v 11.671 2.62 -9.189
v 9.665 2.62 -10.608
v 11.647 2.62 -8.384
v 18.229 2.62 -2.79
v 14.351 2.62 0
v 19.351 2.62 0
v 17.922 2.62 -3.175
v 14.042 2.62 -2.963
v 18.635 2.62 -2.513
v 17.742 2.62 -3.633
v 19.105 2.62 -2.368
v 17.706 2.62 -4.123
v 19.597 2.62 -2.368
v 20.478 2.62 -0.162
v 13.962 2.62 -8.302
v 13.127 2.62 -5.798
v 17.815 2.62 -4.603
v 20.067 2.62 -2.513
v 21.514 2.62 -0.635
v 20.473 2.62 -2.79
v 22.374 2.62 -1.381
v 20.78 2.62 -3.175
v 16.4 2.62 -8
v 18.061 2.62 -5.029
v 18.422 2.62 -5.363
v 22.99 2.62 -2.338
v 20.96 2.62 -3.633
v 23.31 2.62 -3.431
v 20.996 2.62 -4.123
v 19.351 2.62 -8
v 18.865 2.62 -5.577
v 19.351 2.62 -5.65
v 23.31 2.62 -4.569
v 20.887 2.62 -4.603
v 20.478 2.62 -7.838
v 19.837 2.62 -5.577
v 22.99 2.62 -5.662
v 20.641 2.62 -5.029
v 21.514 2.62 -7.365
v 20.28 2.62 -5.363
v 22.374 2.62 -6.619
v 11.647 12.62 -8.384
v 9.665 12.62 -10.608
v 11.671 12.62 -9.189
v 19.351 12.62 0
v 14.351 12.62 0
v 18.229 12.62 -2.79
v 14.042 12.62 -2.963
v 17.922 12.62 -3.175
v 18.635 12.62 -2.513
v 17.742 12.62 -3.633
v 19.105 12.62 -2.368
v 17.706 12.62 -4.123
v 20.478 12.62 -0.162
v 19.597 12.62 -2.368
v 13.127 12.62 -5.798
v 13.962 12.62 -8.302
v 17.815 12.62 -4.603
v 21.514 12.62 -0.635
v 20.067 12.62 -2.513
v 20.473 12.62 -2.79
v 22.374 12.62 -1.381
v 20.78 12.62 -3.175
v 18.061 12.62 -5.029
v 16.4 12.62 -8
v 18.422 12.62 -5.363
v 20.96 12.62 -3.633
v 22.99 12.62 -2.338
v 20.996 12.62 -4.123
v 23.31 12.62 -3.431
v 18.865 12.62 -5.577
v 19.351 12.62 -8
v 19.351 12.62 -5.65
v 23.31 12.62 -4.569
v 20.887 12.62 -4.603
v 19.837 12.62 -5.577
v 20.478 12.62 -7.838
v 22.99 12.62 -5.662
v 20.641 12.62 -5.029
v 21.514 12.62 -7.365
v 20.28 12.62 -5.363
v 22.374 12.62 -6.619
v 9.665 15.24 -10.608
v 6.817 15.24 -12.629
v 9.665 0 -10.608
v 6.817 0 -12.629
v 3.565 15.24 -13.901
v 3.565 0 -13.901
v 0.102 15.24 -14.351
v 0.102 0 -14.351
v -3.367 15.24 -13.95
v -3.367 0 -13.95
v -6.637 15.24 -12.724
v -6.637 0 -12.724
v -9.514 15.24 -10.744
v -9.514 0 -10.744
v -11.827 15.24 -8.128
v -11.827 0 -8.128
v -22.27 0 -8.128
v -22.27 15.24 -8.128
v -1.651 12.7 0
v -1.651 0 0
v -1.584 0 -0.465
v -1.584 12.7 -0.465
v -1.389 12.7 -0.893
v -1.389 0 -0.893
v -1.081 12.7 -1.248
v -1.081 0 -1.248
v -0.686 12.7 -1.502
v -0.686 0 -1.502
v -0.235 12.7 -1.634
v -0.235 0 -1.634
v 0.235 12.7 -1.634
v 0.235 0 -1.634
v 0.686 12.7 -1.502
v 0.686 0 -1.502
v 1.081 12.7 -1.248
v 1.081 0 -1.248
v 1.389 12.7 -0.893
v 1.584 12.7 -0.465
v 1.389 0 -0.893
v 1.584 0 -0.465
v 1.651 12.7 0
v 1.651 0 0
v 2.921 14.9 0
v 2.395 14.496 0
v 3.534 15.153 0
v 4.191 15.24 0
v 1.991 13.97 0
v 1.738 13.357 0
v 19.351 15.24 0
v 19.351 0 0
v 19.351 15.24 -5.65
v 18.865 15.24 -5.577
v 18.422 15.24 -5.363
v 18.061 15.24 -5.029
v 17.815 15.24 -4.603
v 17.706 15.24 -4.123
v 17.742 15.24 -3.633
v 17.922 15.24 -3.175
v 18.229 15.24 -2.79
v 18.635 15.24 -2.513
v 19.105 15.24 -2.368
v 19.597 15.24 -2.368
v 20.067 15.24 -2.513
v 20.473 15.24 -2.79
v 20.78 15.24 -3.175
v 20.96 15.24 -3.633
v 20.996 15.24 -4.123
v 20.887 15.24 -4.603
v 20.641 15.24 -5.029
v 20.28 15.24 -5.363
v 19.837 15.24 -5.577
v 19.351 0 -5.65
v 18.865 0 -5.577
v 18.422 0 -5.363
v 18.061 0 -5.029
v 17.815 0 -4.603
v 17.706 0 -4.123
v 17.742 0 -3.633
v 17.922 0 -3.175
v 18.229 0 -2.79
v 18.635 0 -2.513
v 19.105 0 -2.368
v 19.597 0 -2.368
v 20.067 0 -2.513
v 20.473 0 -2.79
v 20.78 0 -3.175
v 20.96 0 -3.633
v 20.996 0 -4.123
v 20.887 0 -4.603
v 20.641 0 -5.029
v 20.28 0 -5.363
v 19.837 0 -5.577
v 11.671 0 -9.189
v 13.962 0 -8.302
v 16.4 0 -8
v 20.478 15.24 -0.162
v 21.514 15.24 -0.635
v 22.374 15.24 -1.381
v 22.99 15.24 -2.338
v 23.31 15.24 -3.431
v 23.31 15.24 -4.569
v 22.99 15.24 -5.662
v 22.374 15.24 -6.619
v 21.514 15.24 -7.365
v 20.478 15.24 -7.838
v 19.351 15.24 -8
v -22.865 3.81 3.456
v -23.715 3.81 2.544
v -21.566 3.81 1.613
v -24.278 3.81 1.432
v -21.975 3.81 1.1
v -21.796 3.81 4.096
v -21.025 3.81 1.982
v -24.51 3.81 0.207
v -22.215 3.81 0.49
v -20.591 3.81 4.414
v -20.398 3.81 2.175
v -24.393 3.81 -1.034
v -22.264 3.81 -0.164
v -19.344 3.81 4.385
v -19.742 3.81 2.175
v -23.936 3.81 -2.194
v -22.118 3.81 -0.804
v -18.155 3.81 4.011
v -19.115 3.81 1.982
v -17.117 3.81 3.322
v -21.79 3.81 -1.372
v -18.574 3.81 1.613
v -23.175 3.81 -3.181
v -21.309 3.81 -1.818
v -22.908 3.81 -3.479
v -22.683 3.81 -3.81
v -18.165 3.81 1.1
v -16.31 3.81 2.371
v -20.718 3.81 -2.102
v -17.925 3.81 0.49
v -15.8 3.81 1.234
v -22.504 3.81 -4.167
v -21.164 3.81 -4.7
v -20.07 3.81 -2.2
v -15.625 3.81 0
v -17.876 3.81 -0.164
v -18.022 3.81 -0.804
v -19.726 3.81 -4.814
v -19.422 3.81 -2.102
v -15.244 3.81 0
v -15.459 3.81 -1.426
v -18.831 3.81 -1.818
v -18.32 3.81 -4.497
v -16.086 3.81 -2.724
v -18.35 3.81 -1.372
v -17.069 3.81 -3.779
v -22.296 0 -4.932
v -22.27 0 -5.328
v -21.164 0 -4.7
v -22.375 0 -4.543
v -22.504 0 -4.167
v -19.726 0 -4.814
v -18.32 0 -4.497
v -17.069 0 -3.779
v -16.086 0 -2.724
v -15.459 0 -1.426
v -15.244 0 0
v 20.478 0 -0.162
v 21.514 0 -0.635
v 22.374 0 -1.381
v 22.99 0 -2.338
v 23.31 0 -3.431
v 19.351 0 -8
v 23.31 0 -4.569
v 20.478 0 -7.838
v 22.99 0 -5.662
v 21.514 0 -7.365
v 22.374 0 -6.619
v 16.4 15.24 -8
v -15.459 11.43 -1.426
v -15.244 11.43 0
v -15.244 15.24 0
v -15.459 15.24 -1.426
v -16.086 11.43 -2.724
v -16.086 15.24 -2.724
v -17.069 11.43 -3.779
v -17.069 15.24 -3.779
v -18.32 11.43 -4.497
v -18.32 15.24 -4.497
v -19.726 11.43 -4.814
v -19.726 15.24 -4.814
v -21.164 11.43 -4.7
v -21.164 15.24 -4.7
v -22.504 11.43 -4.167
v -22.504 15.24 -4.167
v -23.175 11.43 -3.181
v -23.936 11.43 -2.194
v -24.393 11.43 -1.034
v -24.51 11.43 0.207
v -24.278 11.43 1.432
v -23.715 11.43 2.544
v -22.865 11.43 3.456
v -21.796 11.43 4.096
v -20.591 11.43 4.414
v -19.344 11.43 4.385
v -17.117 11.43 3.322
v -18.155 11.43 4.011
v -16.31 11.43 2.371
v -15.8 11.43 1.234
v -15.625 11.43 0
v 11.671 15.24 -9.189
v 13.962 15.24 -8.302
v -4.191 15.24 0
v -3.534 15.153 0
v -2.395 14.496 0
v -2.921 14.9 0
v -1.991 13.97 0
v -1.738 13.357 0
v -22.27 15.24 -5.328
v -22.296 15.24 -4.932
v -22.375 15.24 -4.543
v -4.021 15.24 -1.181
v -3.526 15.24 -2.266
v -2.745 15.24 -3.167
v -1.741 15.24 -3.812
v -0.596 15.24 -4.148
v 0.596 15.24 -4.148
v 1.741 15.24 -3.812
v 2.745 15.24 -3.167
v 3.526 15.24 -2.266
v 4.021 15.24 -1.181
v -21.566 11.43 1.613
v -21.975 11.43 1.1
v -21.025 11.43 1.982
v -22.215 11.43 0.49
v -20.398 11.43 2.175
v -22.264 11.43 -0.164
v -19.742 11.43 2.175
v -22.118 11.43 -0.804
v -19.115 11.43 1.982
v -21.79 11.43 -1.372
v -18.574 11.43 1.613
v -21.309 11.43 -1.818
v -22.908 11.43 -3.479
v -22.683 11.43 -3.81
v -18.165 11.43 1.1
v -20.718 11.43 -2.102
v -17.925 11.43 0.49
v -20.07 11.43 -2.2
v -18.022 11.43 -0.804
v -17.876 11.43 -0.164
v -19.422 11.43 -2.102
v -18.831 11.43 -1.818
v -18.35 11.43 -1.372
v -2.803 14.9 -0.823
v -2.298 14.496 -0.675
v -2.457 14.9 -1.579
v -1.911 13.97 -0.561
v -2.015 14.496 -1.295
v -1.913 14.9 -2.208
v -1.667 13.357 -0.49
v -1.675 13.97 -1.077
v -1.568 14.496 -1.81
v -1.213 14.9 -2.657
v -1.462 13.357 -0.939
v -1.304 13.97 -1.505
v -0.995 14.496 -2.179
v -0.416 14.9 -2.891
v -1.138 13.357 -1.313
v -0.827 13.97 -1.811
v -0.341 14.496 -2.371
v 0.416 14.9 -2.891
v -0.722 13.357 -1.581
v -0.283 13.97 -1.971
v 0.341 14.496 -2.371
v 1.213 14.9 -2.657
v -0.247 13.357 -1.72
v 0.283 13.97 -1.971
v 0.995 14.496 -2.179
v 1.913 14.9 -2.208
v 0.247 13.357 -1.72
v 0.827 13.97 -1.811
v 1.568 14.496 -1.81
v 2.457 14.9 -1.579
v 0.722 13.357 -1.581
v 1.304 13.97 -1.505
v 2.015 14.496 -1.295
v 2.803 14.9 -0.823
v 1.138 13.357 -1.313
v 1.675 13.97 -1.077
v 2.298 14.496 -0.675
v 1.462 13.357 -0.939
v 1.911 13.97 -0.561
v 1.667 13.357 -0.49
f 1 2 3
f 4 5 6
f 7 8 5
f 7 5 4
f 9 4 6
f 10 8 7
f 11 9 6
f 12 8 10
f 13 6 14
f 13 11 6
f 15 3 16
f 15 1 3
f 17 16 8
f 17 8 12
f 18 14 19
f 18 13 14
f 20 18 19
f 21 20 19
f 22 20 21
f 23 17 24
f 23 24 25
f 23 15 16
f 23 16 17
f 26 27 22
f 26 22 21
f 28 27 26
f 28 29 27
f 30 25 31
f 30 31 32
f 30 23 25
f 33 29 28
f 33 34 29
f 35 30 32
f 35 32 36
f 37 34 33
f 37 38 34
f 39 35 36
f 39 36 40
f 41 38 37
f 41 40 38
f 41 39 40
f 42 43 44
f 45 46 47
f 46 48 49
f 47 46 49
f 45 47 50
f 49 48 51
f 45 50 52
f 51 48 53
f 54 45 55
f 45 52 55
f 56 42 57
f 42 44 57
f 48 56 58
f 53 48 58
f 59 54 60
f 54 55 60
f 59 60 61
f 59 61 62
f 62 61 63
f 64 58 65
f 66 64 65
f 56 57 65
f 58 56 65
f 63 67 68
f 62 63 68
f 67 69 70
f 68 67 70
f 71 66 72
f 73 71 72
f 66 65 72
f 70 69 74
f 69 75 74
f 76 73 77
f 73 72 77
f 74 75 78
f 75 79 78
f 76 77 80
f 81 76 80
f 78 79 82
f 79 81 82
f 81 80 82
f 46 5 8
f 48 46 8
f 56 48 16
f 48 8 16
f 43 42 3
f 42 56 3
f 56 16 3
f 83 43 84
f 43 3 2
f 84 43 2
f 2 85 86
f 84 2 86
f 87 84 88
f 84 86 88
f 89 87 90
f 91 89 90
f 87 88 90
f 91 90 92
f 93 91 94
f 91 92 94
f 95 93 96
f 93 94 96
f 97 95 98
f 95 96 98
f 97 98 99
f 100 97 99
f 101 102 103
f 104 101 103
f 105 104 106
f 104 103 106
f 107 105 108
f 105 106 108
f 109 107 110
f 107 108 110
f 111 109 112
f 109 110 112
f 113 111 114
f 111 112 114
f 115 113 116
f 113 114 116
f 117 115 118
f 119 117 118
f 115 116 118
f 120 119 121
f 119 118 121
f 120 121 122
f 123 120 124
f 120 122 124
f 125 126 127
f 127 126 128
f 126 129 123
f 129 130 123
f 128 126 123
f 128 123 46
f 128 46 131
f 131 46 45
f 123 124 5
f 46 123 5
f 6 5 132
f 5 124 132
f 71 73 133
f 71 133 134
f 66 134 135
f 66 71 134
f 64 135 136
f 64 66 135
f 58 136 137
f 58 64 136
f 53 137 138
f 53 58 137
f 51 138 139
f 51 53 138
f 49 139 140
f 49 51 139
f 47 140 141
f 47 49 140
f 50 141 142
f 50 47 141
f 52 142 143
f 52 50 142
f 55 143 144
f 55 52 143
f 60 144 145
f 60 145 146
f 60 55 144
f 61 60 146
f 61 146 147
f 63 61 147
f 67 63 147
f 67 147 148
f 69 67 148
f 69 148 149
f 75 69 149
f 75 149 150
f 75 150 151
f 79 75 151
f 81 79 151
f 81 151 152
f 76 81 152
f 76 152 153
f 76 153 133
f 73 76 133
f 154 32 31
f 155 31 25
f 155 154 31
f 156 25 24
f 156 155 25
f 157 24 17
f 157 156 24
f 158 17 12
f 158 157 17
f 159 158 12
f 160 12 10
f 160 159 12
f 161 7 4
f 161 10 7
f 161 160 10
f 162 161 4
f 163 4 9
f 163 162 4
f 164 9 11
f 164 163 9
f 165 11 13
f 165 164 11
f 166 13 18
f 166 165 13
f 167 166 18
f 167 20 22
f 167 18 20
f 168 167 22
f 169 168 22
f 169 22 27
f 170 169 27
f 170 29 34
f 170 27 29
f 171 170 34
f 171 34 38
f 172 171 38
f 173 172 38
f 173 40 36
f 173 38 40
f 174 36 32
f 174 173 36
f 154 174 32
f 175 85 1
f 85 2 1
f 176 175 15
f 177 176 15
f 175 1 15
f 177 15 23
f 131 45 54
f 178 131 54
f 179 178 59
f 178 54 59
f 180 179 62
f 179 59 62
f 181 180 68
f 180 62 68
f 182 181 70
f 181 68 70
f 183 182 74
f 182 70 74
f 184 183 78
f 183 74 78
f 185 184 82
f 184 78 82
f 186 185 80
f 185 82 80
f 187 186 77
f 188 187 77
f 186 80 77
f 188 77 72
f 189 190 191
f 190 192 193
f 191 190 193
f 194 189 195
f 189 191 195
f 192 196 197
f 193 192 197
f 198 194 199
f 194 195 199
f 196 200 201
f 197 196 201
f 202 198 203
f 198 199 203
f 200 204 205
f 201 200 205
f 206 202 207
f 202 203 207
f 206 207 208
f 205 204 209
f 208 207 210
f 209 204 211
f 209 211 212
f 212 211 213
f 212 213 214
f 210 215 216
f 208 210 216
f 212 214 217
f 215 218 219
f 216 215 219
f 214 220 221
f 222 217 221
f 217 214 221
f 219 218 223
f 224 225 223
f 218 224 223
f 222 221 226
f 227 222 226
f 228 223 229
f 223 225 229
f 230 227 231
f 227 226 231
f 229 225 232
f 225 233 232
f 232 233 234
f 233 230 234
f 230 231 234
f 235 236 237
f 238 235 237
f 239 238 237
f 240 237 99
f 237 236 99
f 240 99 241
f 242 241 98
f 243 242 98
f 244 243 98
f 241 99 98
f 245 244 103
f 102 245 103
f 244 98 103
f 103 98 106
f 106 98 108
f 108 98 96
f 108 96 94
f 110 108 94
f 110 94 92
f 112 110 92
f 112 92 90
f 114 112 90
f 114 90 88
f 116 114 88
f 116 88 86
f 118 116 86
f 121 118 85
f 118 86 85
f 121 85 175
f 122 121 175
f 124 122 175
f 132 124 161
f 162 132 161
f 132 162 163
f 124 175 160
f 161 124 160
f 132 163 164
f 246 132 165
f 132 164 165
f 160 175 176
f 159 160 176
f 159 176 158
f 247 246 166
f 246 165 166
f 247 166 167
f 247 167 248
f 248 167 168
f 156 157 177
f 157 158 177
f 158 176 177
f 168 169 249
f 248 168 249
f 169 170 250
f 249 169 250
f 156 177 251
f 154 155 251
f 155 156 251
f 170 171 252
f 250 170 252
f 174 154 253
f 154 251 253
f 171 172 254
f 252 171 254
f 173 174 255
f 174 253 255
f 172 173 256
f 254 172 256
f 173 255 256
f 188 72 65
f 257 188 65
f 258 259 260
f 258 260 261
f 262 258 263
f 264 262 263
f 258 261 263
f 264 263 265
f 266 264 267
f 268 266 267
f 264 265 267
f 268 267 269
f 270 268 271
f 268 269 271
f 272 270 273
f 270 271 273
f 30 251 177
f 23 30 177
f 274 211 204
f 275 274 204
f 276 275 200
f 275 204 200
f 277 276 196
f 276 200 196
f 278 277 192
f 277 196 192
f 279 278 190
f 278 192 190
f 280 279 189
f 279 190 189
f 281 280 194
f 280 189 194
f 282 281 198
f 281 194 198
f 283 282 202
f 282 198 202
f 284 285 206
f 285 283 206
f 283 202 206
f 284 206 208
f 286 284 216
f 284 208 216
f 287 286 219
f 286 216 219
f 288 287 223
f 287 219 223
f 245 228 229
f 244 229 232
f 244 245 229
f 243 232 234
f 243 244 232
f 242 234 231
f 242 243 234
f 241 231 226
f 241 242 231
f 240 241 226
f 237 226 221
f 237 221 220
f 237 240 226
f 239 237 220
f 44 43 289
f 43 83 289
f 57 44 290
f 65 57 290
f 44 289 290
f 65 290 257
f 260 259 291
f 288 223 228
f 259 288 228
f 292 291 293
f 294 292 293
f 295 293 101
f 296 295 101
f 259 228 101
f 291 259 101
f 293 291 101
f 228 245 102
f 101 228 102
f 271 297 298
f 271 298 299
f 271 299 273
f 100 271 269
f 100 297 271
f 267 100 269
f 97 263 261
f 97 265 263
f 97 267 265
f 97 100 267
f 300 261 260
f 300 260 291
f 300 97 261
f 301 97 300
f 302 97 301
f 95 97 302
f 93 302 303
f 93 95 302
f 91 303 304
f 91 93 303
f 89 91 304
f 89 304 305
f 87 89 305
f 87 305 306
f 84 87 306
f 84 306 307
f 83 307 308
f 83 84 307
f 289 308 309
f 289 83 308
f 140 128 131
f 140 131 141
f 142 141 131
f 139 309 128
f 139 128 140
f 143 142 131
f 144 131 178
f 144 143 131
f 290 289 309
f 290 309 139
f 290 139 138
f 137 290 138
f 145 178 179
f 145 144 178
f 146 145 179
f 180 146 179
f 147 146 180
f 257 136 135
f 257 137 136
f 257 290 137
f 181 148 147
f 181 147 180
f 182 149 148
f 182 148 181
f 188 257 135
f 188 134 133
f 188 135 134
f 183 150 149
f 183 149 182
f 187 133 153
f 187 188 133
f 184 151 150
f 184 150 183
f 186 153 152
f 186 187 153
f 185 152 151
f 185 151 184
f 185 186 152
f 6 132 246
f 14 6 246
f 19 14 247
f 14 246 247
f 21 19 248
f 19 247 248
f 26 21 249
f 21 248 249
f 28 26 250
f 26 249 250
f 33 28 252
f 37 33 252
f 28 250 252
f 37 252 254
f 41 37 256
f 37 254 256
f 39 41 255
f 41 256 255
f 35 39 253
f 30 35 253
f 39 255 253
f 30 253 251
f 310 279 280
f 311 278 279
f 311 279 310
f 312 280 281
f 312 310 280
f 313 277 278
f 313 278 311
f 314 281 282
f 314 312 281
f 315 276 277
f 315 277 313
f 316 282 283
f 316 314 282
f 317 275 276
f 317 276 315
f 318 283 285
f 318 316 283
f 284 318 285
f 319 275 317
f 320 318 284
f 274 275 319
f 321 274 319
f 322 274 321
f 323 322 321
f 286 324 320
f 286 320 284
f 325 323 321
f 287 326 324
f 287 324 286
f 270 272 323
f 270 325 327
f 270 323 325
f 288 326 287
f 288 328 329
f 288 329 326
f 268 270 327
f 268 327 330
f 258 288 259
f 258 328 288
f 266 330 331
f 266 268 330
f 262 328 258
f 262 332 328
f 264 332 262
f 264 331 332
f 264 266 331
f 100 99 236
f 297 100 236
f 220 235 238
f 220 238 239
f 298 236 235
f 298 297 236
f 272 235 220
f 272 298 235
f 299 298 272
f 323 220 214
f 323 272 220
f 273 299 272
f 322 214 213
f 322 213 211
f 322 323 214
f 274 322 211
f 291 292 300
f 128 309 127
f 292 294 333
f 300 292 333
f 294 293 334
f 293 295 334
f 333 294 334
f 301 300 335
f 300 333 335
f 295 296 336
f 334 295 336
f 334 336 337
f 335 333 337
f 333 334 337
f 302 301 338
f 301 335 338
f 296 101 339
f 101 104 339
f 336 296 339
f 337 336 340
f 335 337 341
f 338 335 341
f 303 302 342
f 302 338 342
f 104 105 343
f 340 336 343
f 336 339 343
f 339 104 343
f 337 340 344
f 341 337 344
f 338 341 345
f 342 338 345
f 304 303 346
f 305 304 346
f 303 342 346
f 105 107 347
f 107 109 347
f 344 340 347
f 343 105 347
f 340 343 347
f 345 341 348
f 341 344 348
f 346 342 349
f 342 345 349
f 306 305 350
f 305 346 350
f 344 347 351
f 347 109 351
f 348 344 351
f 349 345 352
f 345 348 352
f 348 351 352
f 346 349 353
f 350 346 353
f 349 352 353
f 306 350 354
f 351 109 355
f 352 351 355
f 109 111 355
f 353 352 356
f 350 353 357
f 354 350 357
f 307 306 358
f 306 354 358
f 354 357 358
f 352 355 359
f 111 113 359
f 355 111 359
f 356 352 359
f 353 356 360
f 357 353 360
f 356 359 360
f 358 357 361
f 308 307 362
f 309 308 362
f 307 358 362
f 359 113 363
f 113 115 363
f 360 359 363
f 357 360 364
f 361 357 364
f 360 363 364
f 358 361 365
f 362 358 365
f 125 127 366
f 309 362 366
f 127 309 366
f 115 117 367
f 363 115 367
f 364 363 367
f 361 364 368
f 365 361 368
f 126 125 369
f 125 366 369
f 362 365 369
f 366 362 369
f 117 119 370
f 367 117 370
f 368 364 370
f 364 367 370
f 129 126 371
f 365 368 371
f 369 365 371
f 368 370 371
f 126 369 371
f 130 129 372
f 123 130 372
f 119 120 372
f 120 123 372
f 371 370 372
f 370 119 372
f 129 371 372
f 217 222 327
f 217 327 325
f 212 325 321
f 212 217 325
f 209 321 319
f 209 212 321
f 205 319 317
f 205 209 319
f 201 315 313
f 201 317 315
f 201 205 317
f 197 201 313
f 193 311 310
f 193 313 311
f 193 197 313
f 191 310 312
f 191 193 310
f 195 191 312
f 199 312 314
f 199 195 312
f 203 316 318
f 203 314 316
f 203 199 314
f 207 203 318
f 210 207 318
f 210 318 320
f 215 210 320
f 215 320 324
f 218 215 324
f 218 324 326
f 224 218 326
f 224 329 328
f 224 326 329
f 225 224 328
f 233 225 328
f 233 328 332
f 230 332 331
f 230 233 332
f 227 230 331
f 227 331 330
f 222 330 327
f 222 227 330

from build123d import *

# Parameters (mm, degrees)
SKETCH1_R               = 2.200000000000002
SKETCH1_R_2             = 1.6499999999999986
BOSS_EXTRUDE1_DEPTH     = 15.239999999999998
SKETCH2_R               = 4.8260000000000005
CUT_EXTRUDE1_DEPTH      = 3.8099999999999996
FILLET2_R               = 2.54
FILLET3_R               = 3
CUT_EXTRUDE2_DEPTH      = 5
CUT_EXTRUDE2_DEPTH_BACK = 5
FILLET4_R               = 10


with BuildPart() as part:
    # Sketch1 → Boss-Extrude1 (new body)
    with BuildSketch(Plane(origin=(0, 0, 0), x_dir=(1, 0, 0), z_dir=(0, 1, 0))):
        with BuildLine():
            ThreePointArc((11.827375744432914, 8.128), (0, 14.350999999999997), (-11.827375744432915, 8.128))
            Line((-11.827375744432912, 8.128), (-22.270000000000003, 8.127999999999998))
            Line((-22.270000000000003, 8.127999999999998), (-22.270000000000003, 3.8623859206454227))
            ThreePointArc((-22.270000000000003, 3.8623859206454245), (-22.30372167021767, -3.8429822403961222), (-15.625000000000004, -6.7e-16))
            Line((-15.625, 0), (-1.6509999999999998, 0))
            ThreePointArc((-1.651, -4.2e-16), (-3.8e-16, 1.6509999999999998), (1.6509999999999996, 0))
            Line((1.6509999999999998, 0), (14.350999999999999, -1.6e-16))
            Line((14.350999999999999, -1.6e-16), (19.351, 8.7e-16))
            ThreePointArc((19.351, 1.78e-15), (23.351, 4.000000000000002), (19.351, 8.000000000000002))
            Line((19.351, 8.000000000000002), (11.914327551314004, 8))
            ThreePointArc((11.914327551314003, 7.999999999999999), (11.871024170046155, 8.064117196208148), (11.82737574443291, 8.128))
        make_face()
        with Locations(Location((-20.07, 0, 0), (0, 0, 90))):
            Circle(SKETCH1_R, mode=Mode.SUBTRACT)
        with Locations(Location((19.351, 4.000000000000001, 0), (0, 0, 90))):
            Circle(SKETCH1_R_2, mode=Mode.SUBTRACT)
    extrude(amount=BOSS_EXTRUDE1_DEPTH)

    # Sketch2 → Cut-Extrude1 (cut, symmetric)
    with BuildSketch(Plane(origin=(0, 15.239999999999998, 0), x_dir=(1, 0, 0), z_dir=(0, 1, 0))):
        with Locations((-20.07, 0)):
            Circle(SKETCH2_R)
    cut_extrude1 = extrude(amount=CUT_EXTRUDE1_DEPTH, both=True, mode=Mode.SUBTRACT)

    # Fillet2
    fillet2_edges = [part.edges().sort_by_distance(p)[0] for p in [
        (-3.8e-16, 15.239999999999998, -1.6509999999999998),
    ]]
    fillet(fillet2_edges, radius=FILLET2_R)

    # Mirror1: Cut-Extrude1 across plane
    add(cut_extrude1.mirror(Plane.ZX.offset(7.619999999999999)), mode=Mode.SUBTRACT)

    # Fillet3
    fillet3_edges = [part.edges().sort_by_distance(p)[0] for p in [
        (-22.270000000000003, 7.619999999999999, -3.8623859206454227),
    ]]
    fillet(fillet3_edges, radius=FILLET3_R)

    # Sketch3 → Cut-Extrude2 (cut, two sides: drawn at the far end of the back side and taken through both)
    with BuildSketch(Plane(origin=(0, 7.619999999999999, 0), x_dir=(1, 0, 0), z_dir=(0, 1, 0)).offset(-CUT_EXTRUDE2_DEPTH_BACK)):
        with BuildLine():
            Line((14.350999999999999, -1.6e-16), (19.351, 8.7e-16))
            ThreePointArc((19.351, 8.7e-16), (23.351, 4.000000000000001), (19.351, 8))
            Line((19.351, 8), (11.914327551314004, 8))
            ThreePointArc((11.914327551314004, 8), (13.728323198572127, 4.181428363077186), (14.350999999999999, -1.6e-16))
        make_face()
    extrude(amount=CUT_EXTRUDE2_DEPTH + CUT_EXTRUDE2_DEPTH_BACK, mode=Mode.SUBTRACT)

    # Fillet4
    fillet4_edges = [part.edges().sort_by_distance(p)[0] for p in [
        (11.914327551314003, 13.93, -8),
        (11.914327551314003, 1.3099999999999996, -8),
    ]]
    fillet(fillet4_edges, radius=FILLET4_R)


solid = part.part
